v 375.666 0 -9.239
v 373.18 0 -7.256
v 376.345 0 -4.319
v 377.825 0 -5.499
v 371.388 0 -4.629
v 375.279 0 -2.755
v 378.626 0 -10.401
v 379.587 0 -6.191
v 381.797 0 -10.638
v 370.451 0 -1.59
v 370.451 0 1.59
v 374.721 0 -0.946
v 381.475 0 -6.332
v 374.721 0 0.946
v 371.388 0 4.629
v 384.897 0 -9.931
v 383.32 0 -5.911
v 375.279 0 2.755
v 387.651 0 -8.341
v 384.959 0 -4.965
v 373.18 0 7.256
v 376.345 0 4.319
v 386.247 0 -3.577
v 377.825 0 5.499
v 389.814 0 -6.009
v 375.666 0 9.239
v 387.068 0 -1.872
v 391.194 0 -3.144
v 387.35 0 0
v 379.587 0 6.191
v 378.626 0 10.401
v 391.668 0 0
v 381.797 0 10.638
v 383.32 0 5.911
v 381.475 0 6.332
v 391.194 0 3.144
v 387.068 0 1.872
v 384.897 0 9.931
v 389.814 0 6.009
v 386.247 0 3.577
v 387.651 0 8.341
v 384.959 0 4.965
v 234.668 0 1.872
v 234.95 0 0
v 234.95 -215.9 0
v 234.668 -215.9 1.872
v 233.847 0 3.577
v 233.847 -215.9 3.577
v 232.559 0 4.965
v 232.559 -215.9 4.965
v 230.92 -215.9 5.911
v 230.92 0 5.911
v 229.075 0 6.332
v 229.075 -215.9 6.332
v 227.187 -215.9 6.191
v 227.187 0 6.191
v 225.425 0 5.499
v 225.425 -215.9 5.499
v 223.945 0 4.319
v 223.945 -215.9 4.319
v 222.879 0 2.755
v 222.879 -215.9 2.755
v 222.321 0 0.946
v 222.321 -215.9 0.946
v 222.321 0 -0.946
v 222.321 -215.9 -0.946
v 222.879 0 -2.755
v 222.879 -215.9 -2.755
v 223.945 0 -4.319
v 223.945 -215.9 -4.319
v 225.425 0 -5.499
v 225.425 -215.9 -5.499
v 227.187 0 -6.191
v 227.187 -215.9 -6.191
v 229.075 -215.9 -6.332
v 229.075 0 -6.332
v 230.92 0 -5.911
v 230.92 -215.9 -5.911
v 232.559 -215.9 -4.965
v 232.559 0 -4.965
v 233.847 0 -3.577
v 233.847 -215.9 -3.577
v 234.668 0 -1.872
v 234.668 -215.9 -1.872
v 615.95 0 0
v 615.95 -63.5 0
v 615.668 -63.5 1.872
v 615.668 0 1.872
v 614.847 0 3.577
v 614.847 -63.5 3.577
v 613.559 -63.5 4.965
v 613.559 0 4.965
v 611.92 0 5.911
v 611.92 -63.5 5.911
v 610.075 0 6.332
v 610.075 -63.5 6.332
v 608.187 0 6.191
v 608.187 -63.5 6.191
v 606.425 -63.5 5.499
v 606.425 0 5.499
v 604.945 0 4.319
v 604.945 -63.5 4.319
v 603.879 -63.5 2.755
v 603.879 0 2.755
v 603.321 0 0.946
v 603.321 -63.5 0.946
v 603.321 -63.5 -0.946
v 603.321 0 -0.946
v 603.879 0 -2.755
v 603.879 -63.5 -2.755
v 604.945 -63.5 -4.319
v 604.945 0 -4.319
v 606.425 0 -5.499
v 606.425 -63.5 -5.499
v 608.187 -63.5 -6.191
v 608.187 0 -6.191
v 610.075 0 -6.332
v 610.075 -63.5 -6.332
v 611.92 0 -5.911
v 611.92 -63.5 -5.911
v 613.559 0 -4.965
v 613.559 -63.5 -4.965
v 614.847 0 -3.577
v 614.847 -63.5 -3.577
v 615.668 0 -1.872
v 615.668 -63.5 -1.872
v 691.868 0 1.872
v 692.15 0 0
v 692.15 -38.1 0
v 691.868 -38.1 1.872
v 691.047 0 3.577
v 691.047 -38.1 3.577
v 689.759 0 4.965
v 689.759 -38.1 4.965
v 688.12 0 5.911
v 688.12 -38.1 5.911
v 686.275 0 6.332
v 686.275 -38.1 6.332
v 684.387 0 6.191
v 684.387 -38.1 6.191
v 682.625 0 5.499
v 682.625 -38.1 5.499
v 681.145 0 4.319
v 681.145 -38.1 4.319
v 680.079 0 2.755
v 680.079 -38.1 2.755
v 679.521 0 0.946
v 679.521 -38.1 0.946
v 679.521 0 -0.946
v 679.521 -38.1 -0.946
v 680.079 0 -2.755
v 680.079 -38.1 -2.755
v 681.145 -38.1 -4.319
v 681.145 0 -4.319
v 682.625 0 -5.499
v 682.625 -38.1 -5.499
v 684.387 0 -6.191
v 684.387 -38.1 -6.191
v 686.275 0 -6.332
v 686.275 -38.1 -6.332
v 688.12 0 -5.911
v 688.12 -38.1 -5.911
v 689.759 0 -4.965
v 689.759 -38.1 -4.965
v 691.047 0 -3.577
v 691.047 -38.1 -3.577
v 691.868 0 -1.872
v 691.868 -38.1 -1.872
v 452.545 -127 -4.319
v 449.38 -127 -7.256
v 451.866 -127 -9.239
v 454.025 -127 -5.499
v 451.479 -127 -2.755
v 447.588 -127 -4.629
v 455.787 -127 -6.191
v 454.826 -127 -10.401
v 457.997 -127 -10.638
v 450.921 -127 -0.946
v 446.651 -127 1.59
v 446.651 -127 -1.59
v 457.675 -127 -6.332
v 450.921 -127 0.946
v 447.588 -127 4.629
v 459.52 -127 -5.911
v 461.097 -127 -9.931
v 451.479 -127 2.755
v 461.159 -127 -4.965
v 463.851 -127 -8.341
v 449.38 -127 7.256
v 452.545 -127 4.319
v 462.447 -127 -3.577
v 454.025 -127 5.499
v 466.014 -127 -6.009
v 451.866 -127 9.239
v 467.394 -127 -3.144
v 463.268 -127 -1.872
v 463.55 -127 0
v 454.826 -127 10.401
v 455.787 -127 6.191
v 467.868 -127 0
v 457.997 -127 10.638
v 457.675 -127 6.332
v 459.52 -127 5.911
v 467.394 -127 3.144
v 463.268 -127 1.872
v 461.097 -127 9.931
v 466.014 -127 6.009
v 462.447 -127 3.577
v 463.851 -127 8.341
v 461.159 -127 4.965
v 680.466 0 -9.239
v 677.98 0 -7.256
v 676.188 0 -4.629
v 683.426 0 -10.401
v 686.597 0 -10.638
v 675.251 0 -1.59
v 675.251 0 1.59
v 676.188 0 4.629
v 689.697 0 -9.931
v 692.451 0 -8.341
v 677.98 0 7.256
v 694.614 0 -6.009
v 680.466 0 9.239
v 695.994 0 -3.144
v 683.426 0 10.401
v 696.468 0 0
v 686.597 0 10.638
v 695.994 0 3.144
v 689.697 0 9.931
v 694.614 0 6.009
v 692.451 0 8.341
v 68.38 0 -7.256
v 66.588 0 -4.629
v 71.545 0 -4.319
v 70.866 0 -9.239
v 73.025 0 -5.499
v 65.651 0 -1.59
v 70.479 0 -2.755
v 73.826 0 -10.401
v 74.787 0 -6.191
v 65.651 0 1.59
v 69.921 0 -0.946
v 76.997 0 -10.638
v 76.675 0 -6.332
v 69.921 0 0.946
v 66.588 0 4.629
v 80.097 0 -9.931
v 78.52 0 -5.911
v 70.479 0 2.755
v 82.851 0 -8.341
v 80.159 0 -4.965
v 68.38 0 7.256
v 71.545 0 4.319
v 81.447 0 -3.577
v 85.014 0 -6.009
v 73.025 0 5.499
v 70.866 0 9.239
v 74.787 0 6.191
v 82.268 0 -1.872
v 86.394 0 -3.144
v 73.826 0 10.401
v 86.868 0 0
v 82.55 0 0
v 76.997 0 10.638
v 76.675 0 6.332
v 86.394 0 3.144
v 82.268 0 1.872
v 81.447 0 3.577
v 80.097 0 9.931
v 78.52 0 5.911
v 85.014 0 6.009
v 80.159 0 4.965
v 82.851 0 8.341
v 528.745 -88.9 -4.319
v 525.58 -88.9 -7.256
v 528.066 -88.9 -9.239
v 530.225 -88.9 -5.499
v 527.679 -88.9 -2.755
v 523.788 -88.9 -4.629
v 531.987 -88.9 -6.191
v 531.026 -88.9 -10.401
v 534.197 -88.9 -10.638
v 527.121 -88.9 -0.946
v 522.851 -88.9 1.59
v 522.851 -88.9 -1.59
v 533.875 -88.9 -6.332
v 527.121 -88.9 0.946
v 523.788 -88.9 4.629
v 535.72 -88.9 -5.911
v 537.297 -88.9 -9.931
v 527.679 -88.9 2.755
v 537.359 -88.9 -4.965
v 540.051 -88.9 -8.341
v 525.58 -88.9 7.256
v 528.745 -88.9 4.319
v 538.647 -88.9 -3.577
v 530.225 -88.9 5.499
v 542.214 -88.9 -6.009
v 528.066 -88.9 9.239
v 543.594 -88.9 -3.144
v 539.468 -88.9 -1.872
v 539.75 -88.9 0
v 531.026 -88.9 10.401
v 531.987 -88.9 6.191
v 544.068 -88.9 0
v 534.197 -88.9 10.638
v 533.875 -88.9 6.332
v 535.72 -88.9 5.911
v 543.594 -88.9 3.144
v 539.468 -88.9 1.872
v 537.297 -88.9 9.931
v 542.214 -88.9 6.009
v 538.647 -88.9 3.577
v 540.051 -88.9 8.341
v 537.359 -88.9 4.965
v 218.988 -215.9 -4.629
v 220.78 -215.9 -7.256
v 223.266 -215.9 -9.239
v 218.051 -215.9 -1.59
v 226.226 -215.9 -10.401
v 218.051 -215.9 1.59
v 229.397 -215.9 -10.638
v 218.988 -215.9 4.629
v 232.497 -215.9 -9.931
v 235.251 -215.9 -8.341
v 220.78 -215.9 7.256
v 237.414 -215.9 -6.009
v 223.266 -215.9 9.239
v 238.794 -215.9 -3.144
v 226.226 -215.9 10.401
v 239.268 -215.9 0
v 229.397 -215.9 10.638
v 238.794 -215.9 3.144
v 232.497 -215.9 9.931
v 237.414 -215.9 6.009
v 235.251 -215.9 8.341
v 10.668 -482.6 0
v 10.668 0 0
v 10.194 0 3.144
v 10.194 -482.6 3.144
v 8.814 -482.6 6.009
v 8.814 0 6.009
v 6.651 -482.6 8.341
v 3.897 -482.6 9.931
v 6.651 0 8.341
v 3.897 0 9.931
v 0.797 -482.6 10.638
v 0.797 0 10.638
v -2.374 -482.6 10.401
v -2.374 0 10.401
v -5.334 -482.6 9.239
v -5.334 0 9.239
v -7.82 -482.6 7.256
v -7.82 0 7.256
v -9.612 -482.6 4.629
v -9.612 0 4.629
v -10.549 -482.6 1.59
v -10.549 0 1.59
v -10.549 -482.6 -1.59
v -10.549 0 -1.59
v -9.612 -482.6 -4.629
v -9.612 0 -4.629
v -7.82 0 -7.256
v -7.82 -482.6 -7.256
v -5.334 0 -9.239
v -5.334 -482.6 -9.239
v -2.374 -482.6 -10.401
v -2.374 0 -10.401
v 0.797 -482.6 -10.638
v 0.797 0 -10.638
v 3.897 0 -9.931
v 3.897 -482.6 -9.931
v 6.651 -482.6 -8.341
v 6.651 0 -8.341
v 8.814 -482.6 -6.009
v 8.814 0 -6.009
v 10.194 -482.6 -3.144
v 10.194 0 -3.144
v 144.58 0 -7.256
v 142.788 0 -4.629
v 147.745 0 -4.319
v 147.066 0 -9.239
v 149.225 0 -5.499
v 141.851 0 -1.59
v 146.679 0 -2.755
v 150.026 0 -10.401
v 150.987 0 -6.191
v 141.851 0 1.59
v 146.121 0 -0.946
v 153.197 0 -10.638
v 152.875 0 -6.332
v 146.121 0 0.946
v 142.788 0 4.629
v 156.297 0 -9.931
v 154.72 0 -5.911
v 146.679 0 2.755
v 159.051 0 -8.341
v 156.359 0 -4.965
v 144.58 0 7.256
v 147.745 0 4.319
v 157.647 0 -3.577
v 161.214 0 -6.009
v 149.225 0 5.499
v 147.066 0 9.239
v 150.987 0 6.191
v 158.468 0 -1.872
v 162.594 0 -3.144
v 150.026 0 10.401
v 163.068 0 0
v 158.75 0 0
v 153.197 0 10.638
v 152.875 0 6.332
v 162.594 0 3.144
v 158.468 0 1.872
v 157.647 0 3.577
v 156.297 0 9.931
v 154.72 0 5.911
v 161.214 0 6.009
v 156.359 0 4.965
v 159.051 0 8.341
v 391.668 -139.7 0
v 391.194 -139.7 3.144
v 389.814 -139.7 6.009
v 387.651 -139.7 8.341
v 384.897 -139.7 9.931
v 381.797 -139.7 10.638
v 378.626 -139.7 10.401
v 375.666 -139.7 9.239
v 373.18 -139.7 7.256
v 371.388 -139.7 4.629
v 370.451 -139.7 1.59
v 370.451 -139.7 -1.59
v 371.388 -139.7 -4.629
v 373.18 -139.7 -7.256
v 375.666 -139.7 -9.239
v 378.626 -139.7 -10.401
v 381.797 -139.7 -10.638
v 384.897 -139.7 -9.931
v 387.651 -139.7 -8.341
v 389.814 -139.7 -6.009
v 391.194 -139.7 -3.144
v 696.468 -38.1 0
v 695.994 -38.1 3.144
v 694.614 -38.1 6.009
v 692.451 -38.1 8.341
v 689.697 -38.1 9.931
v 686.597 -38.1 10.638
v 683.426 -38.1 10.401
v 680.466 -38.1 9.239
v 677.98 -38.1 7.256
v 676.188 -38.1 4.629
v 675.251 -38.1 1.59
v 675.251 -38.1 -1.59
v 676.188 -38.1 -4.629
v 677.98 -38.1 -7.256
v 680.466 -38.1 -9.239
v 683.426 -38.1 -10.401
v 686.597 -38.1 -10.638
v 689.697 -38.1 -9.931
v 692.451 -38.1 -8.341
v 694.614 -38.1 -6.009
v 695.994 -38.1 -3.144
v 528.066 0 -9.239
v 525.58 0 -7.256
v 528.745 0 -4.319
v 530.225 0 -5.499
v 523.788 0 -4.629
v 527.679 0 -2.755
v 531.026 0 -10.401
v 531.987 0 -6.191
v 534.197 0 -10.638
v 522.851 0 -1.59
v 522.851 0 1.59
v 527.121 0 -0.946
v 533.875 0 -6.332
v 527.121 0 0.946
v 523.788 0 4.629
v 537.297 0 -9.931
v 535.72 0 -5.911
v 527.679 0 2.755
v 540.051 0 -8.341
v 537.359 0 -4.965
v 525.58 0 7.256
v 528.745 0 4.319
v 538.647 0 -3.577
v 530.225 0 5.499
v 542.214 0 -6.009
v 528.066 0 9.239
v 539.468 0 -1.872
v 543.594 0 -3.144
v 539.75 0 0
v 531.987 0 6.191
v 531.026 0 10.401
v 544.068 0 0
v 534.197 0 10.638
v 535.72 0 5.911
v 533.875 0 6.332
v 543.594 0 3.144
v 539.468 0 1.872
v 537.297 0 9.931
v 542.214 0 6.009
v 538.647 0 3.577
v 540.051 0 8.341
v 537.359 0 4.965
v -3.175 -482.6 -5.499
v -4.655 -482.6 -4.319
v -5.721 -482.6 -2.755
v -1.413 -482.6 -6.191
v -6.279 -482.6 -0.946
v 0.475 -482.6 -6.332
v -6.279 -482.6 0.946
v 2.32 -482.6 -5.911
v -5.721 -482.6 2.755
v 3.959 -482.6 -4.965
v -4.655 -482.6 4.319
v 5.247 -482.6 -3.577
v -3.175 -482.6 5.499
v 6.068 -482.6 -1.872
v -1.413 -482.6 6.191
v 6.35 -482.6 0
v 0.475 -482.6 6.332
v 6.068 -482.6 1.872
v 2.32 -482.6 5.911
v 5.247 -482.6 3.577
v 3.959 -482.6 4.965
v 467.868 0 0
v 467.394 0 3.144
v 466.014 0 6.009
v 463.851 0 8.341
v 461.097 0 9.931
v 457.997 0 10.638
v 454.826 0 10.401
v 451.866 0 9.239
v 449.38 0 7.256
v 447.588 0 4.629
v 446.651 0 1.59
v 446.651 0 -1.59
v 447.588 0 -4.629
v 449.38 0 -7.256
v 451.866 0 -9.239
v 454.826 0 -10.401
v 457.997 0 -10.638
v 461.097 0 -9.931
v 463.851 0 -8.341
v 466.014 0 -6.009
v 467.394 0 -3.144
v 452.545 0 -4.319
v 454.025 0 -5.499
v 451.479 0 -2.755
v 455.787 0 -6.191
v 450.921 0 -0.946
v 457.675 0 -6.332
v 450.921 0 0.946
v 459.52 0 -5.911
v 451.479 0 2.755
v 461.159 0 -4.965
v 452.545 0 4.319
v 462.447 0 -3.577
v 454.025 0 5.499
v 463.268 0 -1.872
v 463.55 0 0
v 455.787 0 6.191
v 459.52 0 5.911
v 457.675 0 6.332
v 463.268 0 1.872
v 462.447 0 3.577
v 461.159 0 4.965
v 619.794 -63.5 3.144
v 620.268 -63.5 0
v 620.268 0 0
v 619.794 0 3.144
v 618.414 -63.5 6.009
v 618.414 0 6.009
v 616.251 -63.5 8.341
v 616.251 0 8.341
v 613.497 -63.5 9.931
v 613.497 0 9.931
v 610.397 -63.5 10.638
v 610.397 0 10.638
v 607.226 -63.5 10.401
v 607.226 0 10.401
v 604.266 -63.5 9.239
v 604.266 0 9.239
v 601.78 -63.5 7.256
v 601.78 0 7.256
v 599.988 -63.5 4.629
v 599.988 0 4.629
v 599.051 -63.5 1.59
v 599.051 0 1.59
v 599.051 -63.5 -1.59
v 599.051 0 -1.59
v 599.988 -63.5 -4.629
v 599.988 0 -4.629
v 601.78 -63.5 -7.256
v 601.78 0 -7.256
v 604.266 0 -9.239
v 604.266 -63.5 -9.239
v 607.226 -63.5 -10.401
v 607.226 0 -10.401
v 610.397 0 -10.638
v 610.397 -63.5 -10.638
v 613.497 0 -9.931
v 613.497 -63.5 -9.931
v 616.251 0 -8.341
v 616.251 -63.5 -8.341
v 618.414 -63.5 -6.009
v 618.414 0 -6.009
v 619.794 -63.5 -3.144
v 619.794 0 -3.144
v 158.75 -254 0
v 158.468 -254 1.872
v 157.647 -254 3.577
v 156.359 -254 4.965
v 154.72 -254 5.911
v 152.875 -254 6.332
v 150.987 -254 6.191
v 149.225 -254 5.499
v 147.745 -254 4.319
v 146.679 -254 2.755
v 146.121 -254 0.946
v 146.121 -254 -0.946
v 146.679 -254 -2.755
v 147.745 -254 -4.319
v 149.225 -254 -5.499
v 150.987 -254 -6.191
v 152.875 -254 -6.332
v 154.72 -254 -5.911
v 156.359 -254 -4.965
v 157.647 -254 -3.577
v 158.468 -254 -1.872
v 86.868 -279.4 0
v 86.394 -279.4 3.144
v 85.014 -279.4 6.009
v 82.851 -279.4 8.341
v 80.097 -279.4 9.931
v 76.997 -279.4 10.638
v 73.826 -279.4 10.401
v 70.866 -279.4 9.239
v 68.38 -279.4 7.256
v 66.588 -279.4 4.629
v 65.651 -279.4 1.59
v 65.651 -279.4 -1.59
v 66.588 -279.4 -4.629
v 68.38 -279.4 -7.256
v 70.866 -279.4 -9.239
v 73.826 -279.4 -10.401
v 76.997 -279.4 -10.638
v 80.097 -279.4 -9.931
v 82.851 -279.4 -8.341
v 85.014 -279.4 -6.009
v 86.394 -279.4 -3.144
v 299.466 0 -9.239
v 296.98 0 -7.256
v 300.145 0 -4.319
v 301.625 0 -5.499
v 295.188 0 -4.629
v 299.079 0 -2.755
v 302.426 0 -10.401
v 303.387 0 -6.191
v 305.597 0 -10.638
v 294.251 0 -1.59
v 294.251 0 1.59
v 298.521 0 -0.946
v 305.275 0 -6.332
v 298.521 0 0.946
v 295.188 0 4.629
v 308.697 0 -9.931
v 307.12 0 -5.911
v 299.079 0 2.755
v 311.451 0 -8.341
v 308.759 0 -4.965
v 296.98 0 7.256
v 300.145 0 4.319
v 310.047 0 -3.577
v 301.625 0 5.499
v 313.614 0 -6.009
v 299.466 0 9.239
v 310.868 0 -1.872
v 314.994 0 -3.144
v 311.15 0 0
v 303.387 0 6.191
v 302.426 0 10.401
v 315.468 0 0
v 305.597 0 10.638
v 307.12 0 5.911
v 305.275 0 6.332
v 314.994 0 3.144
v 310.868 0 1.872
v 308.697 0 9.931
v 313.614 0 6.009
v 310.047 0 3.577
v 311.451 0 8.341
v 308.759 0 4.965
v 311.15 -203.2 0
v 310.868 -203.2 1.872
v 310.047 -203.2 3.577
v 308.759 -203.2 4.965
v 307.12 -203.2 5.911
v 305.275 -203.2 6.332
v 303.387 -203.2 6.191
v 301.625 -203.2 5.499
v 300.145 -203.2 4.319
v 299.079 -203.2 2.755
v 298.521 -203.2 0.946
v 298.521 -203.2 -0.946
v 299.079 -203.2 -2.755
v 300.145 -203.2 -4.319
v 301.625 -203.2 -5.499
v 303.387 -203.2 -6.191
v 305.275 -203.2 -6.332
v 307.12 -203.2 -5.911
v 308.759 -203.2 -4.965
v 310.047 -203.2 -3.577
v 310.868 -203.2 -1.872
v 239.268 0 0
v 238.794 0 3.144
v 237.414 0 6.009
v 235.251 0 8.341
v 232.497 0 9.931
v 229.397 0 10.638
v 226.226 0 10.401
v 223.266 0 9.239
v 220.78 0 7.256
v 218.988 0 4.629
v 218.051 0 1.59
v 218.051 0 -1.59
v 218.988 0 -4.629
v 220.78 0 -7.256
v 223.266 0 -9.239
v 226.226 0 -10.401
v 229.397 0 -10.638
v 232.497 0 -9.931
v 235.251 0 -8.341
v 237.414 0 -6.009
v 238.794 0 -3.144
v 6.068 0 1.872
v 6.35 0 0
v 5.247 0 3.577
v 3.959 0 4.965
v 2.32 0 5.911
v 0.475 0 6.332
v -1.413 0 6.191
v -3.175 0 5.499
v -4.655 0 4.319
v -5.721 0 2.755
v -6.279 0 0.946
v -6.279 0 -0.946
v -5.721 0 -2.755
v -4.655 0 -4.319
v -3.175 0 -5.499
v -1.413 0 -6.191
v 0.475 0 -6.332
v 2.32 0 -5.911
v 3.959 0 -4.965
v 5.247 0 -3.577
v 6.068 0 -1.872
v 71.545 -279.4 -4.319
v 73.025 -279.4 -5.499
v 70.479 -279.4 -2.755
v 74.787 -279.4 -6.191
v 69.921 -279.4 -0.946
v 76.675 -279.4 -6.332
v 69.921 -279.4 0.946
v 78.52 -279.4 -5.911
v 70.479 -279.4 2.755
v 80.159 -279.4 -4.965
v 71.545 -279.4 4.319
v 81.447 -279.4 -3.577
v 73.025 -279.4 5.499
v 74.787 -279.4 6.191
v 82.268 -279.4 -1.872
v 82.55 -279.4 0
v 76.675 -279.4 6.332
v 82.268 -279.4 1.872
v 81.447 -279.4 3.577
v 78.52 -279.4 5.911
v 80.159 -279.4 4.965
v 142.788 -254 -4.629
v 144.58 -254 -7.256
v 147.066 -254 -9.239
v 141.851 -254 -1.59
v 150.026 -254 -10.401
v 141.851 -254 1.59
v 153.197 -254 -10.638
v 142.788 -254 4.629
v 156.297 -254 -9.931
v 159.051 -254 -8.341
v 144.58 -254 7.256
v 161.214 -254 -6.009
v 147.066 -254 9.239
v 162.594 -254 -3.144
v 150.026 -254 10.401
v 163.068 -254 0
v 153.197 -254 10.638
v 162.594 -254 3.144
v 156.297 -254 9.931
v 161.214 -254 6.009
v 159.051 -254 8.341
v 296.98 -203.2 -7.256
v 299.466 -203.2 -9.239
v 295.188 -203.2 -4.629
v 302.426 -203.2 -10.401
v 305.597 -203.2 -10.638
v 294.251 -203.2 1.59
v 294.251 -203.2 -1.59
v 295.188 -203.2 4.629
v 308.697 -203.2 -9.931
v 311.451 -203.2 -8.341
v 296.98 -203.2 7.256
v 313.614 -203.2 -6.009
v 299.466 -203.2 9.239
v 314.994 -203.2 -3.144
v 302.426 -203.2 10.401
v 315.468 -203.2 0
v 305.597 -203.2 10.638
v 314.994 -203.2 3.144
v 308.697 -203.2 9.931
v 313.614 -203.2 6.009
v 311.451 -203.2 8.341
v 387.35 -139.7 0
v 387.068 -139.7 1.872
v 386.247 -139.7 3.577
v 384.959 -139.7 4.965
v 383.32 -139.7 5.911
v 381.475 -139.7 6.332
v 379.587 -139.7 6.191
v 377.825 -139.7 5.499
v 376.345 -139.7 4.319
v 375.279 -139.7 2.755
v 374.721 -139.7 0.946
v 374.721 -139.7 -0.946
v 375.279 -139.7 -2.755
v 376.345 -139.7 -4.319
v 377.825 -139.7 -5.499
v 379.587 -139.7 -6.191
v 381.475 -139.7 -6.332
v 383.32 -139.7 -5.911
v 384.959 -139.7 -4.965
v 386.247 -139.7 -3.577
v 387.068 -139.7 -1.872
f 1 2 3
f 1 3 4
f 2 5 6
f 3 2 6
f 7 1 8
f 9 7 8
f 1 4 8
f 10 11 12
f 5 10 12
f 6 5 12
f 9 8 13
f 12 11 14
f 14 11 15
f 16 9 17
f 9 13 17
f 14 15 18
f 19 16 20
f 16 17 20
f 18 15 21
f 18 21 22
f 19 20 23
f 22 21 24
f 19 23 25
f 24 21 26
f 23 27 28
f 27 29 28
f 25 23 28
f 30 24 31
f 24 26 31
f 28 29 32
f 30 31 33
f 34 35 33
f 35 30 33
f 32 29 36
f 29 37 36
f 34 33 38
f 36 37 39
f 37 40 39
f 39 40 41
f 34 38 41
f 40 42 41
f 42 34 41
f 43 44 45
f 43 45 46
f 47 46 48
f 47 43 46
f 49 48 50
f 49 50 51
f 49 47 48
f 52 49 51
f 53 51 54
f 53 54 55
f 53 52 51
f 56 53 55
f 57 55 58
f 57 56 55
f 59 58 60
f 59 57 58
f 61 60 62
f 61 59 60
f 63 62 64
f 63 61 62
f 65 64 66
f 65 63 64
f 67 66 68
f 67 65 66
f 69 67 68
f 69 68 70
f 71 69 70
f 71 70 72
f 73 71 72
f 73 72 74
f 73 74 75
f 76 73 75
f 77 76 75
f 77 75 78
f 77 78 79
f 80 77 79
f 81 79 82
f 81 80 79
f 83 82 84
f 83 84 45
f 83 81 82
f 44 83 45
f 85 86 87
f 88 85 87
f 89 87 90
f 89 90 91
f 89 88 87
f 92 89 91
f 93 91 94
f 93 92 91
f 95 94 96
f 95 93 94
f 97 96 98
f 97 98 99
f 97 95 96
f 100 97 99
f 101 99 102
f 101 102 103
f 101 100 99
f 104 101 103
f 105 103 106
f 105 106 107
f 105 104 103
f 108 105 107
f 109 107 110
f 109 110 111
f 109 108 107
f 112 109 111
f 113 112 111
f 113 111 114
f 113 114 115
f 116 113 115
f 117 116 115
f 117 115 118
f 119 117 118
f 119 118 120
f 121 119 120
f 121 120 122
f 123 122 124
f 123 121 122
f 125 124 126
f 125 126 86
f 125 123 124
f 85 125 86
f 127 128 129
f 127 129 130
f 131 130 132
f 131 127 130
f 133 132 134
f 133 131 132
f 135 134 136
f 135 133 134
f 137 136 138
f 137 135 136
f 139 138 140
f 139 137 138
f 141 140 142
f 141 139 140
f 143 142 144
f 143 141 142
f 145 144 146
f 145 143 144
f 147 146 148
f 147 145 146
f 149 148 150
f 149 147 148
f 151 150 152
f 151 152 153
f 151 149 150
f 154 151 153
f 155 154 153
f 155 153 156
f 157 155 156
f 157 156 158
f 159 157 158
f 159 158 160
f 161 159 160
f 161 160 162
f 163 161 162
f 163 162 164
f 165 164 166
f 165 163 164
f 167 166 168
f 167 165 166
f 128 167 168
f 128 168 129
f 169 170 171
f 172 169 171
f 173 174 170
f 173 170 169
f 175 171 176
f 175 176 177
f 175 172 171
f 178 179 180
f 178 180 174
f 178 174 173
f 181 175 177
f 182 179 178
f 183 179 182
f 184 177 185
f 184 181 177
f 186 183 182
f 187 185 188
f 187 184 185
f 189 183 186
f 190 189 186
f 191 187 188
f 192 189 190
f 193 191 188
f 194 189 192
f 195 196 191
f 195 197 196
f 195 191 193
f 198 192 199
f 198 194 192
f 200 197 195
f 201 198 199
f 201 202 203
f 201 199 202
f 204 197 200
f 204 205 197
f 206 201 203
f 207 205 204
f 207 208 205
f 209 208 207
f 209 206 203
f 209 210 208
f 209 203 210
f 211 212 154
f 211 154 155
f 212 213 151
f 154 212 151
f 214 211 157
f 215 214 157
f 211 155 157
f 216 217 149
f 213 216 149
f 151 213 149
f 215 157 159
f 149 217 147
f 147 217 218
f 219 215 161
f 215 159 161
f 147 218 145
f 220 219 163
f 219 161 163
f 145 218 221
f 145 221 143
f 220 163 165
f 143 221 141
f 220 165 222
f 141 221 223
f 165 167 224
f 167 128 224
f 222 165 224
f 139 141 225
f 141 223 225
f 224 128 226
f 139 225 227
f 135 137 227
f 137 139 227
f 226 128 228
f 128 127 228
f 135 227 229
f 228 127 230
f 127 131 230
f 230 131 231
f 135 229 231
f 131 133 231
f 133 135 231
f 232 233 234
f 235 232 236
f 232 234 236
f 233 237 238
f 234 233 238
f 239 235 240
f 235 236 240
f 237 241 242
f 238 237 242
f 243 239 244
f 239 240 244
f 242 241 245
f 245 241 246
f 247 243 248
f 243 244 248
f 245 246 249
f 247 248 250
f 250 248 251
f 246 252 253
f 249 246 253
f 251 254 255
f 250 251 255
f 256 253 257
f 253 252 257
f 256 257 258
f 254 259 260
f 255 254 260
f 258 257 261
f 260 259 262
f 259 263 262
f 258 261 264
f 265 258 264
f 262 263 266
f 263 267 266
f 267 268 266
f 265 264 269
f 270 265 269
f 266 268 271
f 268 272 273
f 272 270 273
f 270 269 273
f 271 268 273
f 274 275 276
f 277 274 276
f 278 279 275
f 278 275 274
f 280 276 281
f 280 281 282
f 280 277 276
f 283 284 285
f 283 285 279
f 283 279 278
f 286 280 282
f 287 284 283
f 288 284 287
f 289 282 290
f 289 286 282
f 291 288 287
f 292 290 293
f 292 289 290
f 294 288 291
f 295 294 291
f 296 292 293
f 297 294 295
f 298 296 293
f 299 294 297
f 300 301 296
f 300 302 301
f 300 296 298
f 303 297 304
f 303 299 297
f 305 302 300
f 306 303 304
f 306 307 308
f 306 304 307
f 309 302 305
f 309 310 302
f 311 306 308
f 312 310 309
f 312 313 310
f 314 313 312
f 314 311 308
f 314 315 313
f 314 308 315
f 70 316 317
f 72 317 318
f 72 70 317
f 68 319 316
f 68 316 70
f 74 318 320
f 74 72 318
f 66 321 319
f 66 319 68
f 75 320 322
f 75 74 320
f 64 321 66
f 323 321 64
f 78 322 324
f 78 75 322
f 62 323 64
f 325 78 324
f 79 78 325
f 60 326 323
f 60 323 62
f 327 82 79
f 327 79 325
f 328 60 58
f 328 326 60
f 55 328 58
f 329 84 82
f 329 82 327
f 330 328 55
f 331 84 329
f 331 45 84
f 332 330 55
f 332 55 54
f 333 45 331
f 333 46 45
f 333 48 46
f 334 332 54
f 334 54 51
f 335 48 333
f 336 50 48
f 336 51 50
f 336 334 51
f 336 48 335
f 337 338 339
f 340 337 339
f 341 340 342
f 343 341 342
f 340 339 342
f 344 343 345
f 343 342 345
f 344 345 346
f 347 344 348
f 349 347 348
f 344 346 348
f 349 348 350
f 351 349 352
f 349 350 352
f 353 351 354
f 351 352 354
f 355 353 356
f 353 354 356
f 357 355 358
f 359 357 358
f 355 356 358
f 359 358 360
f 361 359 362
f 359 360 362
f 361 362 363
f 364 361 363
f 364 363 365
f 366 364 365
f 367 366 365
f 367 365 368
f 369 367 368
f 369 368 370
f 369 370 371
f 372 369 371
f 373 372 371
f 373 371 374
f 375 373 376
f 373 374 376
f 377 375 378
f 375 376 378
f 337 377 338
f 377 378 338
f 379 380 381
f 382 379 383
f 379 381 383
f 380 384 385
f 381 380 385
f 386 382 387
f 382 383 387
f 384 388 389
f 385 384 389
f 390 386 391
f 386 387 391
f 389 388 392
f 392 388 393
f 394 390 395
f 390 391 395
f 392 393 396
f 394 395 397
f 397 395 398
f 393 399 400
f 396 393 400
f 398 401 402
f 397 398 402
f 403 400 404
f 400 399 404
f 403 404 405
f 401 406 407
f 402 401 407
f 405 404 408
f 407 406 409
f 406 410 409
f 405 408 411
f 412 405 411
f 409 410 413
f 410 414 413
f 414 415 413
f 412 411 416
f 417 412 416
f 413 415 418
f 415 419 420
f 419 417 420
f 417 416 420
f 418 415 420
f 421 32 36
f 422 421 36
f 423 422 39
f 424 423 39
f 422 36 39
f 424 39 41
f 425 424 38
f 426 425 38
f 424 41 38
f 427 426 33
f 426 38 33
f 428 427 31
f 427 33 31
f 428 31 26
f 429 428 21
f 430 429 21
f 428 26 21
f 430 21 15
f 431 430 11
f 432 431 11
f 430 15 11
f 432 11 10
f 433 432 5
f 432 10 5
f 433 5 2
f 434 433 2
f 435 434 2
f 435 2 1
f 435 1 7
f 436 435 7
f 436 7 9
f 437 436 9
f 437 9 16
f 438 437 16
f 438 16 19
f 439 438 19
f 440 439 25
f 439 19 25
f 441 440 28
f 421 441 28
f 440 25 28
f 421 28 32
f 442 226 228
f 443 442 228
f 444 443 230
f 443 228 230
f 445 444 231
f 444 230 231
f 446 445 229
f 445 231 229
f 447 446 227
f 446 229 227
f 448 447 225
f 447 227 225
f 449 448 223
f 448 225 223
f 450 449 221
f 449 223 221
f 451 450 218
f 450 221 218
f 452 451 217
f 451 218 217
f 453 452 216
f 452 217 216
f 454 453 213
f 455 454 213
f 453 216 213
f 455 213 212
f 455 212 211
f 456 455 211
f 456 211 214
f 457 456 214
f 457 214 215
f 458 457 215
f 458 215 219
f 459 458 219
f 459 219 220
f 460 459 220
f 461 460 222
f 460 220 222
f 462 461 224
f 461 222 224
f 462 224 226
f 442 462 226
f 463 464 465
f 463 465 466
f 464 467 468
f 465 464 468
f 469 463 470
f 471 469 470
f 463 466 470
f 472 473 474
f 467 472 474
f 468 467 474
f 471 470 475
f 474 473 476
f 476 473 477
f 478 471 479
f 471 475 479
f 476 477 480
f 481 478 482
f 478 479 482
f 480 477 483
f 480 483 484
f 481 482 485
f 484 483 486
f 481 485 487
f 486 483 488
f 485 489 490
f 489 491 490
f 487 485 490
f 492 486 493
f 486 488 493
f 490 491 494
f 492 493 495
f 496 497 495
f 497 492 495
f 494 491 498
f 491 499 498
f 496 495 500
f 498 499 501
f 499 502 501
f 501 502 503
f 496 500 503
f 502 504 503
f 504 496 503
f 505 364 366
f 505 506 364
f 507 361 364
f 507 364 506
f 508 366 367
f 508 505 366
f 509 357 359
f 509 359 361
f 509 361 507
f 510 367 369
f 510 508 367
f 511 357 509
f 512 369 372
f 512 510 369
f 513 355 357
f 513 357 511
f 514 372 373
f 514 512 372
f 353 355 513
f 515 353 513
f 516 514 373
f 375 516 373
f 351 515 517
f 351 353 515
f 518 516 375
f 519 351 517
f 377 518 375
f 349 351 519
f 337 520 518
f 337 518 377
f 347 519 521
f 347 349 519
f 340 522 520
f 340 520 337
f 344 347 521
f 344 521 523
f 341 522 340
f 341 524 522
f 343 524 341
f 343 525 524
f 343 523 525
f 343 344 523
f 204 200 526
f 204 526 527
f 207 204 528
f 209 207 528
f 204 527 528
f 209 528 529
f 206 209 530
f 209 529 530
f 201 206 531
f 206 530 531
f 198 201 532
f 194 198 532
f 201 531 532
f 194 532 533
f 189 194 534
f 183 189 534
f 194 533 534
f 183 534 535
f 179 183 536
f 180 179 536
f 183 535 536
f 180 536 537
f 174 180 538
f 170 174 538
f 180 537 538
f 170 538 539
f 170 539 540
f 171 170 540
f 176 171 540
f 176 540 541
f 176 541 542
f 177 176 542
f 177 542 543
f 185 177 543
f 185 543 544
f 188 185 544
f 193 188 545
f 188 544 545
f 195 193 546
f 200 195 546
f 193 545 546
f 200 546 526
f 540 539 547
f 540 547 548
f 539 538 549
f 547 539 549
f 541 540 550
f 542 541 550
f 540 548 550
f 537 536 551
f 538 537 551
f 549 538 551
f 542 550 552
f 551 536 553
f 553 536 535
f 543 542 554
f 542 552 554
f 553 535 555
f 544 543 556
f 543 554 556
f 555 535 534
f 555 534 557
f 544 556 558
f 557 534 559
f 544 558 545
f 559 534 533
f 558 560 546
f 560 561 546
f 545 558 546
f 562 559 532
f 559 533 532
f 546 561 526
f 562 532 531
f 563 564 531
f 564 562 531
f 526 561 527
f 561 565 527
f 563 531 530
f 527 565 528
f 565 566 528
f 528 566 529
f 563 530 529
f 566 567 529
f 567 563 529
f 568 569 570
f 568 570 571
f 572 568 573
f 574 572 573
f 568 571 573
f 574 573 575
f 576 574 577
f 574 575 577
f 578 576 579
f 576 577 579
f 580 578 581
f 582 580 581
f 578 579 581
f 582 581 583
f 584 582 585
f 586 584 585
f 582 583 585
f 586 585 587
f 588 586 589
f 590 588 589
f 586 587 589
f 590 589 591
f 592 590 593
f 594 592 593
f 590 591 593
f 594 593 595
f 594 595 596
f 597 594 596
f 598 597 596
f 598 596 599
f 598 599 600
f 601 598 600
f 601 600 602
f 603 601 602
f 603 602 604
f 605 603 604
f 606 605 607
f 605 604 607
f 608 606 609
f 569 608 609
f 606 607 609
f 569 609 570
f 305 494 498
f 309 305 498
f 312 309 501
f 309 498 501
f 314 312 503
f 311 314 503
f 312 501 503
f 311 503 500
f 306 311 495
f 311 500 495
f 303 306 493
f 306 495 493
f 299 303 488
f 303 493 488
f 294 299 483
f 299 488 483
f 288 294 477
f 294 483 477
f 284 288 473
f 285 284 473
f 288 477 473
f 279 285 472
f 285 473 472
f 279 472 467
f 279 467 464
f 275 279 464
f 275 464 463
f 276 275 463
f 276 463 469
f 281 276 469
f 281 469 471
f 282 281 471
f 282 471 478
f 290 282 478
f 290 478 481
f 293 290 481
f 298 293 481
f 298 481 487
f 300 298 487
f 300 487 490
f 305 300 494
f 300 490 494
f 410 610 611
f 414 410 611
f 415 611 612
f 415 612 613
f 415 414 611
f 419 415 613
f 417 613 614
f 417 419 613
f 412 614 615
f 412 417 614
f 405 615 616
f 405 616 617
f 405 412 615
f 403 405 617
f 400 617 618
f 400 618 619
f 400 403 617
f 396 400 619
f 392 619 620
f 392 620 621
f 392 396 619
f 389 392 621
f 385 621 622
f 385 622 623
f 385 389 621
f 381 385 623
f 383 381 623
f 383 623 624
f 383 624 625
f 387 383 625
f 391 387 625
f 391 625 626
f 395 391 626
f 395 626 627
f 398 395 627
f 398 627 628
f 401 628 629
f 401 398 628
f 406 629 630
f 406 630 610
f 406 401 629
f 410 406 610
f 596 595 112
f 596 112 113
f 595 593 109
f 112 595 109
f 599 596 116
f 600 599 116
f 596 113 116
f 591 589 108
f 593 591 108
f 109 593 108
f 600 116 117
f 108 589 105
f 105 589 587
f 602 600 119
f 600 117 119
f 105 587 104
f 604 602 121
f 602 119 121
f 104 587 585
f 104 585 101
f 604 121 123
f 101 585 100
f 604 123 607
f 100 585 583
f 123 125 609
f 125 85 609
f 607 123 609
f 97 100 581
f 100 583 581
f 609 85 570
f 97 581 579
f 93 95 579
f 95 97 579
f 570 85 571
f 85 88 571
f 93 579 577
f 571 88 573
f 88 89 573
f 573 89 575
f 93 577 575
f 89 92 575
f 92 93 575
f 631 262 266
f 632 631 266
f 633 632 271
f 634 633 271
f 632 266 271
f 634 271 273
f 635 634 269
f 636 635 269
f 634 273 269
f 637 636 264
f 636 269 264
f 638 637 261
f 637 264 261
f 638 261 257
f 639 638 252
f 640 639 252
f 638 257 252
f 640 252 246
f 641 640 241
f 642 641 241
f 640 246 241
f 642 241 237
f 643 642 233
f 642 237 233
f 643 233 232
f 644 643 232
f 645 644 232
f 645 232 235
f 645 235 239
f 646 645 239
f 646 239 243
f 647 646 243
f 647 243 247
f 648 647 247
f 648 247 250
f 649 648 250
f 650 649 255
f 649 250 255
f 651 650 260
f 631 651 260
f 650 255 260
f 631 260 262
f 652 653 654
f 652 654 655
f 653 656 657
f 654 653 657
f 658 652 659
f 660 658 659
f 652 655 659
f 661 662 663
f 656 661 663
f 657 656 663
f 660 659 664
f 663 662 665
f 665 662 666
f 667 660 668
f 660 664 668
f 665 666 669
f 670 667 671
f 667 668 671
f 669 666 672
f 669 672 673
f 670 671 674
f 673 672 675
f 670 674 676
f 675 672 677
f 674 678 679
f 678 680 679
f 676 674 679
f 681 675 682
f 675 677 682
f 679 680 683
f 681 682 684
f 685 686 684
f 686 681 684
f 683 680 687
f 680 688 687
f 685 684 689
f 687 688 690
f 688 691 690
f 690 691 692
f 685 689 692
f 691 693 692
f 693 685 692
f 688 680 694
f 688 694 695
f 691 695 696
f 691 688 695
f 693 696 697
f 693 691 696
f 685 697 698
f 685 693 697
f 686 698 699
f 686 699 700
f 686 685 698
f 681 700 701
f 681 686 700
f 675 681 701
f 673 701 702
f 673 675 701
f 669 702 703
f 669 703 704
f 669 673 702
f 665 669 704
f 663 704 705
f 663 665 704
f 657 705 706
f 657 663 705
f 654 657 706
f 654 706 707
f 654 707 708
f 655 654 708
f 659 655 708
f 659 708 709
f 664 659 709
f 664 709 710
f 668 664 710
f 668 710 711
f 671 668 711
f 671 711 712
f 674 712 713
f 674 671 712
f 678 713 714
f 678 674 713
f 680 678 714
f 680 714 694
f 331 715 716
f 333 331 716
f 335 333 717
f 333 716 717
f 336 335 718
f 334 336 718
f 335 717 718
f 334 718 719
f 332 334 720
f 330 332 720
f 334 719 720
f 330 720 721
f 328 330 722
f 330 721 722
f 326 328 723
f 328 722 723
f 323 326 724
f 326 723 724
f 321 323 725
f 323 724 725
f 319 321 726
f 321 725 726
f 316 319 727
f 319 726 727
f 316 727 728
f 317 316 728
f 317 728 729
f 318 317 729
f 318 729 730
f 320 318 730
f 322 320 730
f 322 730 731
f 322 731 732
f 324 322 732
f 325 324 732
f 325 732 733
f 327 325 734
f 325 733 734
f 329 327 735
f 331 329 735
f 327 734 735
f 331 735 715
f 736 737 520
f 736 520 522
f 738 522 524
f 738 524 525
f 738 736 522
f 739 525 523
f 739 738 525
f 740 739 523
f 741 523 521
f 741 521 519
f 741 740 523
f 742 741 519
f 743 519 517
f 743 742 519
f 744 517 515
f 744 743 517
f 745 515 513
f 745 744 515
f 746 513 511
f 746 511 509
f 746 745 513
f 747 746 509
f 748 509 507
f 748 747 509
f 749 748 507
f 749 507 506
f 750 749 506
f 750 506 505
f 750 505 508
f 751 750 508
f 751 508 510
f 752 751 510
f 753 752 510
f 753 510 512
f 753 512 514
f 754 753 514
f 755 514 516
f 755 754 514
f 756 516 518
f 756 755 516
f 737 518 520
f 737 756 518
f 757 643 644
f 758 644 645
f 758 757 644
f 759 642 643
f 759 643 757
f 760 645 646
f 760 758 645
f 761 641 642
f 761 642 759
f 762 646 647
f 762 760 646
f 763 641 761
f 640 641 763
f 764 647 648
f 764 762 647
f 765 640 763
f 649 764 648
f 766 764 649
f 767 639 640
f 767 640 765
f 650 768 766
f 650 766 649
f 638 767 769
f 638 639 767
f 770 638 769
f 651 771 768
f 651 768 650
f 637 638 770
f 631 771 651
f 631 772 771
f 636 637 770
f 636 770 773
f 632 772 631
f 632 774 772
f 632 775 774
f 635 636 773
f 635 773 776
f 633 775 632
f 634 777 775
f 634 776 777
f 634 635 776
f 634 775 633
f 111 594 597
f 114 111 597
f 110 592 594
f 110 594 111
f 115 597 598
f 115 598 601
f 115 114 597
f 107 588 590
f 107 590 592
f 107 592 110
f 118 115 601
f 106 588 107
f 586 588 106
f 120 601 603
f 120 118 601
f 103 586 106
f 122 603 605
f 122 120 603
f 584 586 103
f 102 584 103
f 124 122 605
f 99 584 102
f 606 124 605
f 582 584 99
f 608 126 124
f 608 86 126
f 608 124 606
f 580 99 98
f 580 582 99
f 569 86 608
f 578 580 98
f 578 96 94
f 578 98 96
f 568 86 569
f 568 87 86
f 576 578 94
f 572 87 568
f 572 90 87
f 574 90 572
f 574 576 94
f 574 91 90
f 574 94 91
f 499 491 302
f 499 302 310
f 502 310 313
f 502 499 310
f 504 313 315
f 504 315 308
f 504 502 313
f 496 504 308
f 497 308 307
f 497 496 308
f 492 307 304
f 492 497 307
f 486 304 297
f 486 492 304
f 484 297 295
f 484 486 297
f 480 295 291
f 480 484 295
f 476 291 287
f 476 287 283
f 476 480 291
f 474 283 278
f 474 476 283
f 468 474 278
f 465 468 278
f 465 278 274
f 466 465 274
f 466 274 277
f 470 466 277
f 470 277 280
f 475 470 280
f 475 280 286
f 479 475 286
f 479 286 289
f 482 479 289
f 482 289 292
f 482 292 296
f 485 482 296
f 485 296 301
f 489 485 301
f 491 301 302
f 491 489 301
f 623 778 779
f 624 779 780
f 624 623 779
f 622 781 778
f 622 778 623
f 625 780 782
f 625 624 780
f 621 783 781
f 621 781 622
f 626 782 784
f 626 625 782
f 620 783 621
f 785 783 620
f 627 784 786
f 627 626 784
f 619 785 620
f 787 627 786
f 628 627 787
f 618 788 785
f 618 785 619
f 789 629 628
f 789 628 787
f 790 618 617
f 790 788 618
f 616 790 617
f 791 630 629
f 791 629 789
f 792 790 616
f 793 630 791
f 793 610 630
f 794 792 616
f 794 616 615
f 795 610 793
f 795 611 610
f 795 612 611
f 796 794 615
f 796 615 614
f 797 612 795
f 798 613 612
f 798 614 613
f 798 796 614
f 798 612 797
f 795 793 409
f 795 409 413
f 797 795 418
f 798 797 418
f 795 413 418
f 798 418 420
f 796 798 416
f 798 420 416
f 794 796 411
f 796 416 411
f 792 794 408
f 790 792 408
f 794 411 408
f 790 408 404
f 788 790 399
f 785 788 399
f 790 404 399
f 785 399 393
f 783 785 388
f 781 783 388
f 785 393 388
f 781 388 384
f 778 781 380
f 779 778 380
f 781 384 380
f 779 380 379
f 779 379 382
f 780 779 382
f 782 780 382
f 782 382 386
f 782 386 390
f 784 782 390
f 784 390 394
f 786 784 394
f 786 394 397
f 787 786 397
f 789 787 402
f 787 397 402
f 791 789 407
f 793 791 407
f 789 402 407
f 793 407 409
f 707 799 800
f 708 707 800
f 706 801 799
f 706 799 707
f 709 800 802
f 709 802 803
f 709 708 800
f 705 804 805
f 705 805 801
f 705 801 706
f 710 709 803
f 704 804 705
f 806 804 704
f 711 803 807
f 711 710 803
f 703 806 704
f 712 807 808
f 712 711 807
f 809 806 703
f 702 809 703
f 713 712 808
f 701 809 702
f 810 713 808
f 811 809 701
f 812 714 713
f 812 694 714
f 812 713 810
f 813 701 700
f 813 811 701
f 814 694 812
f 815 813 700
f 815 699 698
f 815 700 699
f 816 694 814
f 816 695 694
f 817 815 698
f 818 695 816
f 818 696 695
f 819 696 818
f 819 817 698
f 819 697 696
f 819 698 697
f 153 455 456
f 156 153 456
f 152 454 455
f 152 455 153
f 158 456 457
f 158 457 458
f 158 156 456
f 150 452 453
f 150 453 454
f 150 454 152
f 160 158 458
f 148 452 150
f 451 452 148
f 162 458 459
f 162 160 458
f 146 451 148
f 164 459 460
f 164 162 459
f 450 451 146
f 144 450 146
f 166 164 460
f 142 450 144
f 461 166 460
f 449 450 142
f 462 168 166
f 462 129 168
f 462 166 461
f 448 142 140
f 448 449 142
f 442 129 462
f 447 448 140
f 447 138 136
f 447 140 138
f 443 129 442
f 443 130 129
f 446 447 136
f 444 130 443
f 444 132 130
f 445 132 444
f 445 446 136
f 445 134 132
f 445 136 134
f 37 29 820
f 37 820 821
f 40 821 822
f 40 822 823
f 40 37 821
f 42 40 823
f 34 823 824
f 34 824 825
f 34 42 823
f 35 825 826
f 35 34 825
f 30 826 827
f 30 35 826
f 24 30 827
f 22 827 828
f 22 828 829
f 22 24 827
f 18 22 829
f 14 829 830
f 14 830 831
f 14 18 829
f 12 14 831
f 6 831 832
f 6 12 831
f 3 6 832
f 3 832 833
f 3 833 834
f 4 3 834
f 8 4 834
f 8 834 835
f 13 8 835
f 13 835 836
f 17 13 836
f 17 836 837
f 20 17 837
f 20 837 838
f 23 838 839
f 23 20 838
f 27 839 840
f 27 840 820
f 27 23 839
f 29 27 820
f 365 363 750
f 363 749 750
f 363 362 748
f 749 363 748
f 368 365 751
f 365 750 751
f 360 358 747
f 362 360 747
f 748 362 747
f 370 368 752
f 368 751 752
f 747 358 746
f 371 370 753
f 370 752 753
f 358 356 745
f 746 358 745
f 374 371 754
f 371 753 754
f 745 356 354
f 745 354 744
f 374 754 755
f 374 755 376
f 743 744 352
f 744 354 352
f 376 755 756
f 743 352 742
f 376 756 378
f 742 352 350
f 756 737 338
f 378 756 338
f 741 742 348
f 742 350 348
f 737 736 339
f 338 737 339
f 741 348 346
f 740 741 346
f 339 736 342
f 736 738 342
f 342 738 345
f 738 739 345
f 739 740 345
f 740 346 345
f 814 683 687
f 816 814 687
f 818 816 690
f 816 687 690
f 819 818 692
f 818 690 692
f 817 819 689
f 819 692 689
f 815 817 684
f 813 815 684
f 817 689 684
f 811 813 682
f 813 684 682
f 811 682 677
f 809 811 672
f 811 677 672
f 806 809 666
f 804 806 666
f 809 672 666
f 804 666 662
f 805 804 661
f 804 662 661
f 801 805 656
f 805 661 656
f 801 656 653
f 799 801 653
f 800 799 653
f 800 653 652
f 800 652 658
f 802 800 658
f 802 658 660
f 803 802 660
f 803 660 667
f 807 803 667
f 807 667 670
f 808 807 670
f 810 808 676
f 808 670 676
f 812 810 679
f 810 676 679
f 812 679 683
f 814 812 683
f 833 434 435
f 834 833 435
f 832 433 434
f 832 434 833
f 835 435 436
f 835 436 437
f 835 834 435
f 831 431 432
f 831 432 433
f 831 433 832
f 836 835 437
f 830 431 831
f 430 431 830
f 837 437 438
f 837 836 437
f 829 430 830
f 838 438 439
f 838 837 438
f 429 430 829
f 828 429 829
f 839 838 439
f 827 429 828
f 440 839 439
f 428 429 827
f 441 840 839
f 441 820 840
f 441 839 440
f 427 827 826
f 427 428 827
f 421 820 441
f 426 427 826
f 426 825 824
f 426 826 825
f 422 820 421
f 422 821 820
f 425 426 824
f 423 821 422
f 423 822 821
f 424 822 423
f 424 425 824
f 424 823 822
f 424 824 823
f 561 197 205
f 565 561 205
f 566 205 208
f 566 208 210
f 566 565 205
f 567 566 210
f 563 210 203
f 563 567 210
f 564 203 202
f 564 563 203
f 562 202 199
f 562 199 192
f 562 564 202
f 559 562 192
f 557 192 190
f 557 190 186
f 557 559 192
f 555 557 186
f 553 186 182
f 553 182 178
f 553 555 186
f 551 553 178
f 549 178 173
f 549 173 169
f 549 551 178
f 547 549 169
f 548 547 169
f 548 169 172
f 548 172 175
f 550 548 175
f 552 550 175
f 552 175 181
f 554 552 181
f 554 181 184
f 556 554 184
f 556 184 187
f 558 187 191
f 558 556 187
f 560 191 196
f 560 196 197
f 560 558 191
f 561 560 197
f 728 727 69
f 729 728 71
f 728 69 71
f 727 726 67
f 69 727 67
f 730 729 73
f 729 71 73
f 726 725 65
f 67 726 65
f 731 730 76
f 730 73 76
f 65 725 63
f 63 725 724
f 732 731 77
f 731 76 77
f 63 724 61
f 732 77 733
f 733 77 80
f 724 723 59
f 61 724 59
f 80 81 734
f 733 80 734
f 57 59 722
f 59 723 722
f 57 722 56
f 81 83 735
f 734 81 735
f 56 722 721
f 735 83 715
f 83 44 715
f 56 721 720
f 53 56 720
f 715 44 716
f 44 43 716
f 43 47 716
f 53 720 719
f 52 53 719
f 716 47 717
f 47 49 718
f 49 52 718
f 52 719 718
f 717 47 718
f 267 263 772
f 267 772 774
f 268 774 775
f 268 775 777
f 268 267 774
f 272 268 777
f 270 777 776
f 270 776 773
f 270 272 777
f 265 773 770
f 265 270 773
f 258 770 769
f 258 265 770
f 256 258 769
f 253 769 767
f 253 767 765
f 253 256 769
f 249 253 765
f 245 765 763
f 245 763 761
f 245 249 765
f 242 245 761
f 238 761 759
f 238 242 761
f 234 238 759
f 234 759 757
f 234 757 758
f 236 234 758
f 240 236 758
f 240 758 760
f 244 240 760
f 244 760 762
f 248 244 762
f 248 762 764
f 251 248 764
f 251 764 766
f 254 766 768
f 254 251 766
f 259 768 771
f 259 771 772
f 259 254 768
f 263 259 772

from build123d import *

# Parameters (mm, degrees)
F0_R      = 10.668
F0_R_2    = 6.35
F1_DEPTH  = 482.6
F2_R      = 10.668
F2_R_2    = 6.35
F3_DEPTH  = 279.4
F4_R      = 10.668
F4_R_2    = 6.35
F5_DEPTH  = 254
F6_R      = 10.668
F6_R_2    = 6.35
F7_DEPTH  = 215.9
F8_R      = 10.668
F8_R_2    = 6.35
F9_DEPTH  = 203.2
F10_R     = 10.668
F10_R_2   = 6.35
F11_DEPTH = 139.7
F12_R     = 10.668
F12_R_2   = 6.35
F13_DEPTH = 127
F14_R     = 10.668
F14_R_2   = 6.35
F15_DEPTH = 88.9
F16_R     = 10.668
F16_R_2   = 6.35
F17_DEPTH = 63.5
F18_R     = 10.668
F18_R_2   = 6.35
F19_DEPTH = 38.1


with BuildPart() as f1:
    # F0 (on Front) → F1 (new body)
    with BuildSketch(Plane.XZ):
        Circle(F0_R)
        Circle(F0_R_2, mode=Mode.SUBTRACT)
    extrude(amount=F1_DEPTH)


with BuildPart() as f3:
    # F2 (on Front) → F3 (new body)
    with BuildSketch(Plane.XZ):
        with Locations((76.2, 0)):
            Circle(F2_R)
        with Locations((76.2, 0)):
            Circle(F2_R_2, mode=Mode.SUBTRACT)
    extrude(amount=F3_DEPTH)


with BuildPart() as f5:
    # F4 (on Front) → F5 (new body)
    with BuildSketch(Plane.XZ):
        with Locations((152.4, 0)):
            Circle(F4_R)
        with Locations((152.4, 0)):
            Circle(F4_R_2, mode=Mode.SUBTRACT)
    extrude(amount=F5_DEPTH)


with BuildPart() as f7:
    # F6 (on Front) → F7 (new body)
    with BuildSketch(Plane.XZ):
        with Locations((228.6, 0)):
            Circle(F6_R)
        with Locations((228.6, 0)):
            Circle(F6_R_2, mode=Mode.SUBTRACT)
    extrude(amount=F7_DEPTH)


with BuildPart() as f9:
    # F8 (on Front) → F9 (new body)
    with BuildSketch(Plane.XZ):
        with Locations((304.8, 0)):
            Circle(F8_R)
        with Locations((304.8, 0)):
            Circle(F8_R_2, mode=Mode.SUBTRACT)
    extrude(amount=F9_DEPTH)


with BuildPart() as f11:
    # F10 (on Front) → F11 (new body)
    with BuildSketch(Plane.XZ):
        with Locations((381, 0)):
            Circle(F10_R)
        with Locations((381, 0)):
            Circle(F10_R_2, mode=Mode.SUBTRACT)
    extrude(amount=F11_DEPTH)


with BuildPart() as f13:
    # F12 (on Front) → F13 (new body)
    with BuildSketch(Plane.XZ):
        with Locations((457.2, 0)):
            Circle(F12_R)
        with Locations((457.2, 0)):
            Circle(F12_R_2, mode=Mode.SUBTRACT)
    extrude(amount=F13_DEPTH)


with BuildPart() as f15:
    # F14 (on Front) → F15 (new body)
    with BuildSketch(Plane.XZ):
        with Locations((533.4, 0)):
            Circle(F14_R)
        with Locations((533.4, 0)):
            Circle(F14_R_2, mode=Mode.SUBTRACT)
    extrude(amount=F15_DEPTH)


with BuildPart() as f17:
    # F16 (on Front) → F17 (new body)
    with BuildSketch(Plane.XZ):
        with Locations((609.6, 0)):
            Circle(F16_R)
        with Locations((609.6, 0)):
            Circle(F16_R_2, mode=Mode.SUBTRACT)
    extrude(amount=F17_DEPTH)


with BuildPart() as f19:
    # F18 (on Front) → F19 (new body)
    with BuildSketch(Plane.XZ):
        with Locations((685.8, 0)):
            Circle(F18_R)
        with Locations((685.8, 0)):
            Circle(F18_R_2, mode=Mode.SUBTRACT)
    extrude(amount=F19_DEPTH)


solid = Compound([f1.part, f3.part, f5.part, f7.part, f9.part, f11.part, f13.part, f15.part, f17.part, f19.part])
